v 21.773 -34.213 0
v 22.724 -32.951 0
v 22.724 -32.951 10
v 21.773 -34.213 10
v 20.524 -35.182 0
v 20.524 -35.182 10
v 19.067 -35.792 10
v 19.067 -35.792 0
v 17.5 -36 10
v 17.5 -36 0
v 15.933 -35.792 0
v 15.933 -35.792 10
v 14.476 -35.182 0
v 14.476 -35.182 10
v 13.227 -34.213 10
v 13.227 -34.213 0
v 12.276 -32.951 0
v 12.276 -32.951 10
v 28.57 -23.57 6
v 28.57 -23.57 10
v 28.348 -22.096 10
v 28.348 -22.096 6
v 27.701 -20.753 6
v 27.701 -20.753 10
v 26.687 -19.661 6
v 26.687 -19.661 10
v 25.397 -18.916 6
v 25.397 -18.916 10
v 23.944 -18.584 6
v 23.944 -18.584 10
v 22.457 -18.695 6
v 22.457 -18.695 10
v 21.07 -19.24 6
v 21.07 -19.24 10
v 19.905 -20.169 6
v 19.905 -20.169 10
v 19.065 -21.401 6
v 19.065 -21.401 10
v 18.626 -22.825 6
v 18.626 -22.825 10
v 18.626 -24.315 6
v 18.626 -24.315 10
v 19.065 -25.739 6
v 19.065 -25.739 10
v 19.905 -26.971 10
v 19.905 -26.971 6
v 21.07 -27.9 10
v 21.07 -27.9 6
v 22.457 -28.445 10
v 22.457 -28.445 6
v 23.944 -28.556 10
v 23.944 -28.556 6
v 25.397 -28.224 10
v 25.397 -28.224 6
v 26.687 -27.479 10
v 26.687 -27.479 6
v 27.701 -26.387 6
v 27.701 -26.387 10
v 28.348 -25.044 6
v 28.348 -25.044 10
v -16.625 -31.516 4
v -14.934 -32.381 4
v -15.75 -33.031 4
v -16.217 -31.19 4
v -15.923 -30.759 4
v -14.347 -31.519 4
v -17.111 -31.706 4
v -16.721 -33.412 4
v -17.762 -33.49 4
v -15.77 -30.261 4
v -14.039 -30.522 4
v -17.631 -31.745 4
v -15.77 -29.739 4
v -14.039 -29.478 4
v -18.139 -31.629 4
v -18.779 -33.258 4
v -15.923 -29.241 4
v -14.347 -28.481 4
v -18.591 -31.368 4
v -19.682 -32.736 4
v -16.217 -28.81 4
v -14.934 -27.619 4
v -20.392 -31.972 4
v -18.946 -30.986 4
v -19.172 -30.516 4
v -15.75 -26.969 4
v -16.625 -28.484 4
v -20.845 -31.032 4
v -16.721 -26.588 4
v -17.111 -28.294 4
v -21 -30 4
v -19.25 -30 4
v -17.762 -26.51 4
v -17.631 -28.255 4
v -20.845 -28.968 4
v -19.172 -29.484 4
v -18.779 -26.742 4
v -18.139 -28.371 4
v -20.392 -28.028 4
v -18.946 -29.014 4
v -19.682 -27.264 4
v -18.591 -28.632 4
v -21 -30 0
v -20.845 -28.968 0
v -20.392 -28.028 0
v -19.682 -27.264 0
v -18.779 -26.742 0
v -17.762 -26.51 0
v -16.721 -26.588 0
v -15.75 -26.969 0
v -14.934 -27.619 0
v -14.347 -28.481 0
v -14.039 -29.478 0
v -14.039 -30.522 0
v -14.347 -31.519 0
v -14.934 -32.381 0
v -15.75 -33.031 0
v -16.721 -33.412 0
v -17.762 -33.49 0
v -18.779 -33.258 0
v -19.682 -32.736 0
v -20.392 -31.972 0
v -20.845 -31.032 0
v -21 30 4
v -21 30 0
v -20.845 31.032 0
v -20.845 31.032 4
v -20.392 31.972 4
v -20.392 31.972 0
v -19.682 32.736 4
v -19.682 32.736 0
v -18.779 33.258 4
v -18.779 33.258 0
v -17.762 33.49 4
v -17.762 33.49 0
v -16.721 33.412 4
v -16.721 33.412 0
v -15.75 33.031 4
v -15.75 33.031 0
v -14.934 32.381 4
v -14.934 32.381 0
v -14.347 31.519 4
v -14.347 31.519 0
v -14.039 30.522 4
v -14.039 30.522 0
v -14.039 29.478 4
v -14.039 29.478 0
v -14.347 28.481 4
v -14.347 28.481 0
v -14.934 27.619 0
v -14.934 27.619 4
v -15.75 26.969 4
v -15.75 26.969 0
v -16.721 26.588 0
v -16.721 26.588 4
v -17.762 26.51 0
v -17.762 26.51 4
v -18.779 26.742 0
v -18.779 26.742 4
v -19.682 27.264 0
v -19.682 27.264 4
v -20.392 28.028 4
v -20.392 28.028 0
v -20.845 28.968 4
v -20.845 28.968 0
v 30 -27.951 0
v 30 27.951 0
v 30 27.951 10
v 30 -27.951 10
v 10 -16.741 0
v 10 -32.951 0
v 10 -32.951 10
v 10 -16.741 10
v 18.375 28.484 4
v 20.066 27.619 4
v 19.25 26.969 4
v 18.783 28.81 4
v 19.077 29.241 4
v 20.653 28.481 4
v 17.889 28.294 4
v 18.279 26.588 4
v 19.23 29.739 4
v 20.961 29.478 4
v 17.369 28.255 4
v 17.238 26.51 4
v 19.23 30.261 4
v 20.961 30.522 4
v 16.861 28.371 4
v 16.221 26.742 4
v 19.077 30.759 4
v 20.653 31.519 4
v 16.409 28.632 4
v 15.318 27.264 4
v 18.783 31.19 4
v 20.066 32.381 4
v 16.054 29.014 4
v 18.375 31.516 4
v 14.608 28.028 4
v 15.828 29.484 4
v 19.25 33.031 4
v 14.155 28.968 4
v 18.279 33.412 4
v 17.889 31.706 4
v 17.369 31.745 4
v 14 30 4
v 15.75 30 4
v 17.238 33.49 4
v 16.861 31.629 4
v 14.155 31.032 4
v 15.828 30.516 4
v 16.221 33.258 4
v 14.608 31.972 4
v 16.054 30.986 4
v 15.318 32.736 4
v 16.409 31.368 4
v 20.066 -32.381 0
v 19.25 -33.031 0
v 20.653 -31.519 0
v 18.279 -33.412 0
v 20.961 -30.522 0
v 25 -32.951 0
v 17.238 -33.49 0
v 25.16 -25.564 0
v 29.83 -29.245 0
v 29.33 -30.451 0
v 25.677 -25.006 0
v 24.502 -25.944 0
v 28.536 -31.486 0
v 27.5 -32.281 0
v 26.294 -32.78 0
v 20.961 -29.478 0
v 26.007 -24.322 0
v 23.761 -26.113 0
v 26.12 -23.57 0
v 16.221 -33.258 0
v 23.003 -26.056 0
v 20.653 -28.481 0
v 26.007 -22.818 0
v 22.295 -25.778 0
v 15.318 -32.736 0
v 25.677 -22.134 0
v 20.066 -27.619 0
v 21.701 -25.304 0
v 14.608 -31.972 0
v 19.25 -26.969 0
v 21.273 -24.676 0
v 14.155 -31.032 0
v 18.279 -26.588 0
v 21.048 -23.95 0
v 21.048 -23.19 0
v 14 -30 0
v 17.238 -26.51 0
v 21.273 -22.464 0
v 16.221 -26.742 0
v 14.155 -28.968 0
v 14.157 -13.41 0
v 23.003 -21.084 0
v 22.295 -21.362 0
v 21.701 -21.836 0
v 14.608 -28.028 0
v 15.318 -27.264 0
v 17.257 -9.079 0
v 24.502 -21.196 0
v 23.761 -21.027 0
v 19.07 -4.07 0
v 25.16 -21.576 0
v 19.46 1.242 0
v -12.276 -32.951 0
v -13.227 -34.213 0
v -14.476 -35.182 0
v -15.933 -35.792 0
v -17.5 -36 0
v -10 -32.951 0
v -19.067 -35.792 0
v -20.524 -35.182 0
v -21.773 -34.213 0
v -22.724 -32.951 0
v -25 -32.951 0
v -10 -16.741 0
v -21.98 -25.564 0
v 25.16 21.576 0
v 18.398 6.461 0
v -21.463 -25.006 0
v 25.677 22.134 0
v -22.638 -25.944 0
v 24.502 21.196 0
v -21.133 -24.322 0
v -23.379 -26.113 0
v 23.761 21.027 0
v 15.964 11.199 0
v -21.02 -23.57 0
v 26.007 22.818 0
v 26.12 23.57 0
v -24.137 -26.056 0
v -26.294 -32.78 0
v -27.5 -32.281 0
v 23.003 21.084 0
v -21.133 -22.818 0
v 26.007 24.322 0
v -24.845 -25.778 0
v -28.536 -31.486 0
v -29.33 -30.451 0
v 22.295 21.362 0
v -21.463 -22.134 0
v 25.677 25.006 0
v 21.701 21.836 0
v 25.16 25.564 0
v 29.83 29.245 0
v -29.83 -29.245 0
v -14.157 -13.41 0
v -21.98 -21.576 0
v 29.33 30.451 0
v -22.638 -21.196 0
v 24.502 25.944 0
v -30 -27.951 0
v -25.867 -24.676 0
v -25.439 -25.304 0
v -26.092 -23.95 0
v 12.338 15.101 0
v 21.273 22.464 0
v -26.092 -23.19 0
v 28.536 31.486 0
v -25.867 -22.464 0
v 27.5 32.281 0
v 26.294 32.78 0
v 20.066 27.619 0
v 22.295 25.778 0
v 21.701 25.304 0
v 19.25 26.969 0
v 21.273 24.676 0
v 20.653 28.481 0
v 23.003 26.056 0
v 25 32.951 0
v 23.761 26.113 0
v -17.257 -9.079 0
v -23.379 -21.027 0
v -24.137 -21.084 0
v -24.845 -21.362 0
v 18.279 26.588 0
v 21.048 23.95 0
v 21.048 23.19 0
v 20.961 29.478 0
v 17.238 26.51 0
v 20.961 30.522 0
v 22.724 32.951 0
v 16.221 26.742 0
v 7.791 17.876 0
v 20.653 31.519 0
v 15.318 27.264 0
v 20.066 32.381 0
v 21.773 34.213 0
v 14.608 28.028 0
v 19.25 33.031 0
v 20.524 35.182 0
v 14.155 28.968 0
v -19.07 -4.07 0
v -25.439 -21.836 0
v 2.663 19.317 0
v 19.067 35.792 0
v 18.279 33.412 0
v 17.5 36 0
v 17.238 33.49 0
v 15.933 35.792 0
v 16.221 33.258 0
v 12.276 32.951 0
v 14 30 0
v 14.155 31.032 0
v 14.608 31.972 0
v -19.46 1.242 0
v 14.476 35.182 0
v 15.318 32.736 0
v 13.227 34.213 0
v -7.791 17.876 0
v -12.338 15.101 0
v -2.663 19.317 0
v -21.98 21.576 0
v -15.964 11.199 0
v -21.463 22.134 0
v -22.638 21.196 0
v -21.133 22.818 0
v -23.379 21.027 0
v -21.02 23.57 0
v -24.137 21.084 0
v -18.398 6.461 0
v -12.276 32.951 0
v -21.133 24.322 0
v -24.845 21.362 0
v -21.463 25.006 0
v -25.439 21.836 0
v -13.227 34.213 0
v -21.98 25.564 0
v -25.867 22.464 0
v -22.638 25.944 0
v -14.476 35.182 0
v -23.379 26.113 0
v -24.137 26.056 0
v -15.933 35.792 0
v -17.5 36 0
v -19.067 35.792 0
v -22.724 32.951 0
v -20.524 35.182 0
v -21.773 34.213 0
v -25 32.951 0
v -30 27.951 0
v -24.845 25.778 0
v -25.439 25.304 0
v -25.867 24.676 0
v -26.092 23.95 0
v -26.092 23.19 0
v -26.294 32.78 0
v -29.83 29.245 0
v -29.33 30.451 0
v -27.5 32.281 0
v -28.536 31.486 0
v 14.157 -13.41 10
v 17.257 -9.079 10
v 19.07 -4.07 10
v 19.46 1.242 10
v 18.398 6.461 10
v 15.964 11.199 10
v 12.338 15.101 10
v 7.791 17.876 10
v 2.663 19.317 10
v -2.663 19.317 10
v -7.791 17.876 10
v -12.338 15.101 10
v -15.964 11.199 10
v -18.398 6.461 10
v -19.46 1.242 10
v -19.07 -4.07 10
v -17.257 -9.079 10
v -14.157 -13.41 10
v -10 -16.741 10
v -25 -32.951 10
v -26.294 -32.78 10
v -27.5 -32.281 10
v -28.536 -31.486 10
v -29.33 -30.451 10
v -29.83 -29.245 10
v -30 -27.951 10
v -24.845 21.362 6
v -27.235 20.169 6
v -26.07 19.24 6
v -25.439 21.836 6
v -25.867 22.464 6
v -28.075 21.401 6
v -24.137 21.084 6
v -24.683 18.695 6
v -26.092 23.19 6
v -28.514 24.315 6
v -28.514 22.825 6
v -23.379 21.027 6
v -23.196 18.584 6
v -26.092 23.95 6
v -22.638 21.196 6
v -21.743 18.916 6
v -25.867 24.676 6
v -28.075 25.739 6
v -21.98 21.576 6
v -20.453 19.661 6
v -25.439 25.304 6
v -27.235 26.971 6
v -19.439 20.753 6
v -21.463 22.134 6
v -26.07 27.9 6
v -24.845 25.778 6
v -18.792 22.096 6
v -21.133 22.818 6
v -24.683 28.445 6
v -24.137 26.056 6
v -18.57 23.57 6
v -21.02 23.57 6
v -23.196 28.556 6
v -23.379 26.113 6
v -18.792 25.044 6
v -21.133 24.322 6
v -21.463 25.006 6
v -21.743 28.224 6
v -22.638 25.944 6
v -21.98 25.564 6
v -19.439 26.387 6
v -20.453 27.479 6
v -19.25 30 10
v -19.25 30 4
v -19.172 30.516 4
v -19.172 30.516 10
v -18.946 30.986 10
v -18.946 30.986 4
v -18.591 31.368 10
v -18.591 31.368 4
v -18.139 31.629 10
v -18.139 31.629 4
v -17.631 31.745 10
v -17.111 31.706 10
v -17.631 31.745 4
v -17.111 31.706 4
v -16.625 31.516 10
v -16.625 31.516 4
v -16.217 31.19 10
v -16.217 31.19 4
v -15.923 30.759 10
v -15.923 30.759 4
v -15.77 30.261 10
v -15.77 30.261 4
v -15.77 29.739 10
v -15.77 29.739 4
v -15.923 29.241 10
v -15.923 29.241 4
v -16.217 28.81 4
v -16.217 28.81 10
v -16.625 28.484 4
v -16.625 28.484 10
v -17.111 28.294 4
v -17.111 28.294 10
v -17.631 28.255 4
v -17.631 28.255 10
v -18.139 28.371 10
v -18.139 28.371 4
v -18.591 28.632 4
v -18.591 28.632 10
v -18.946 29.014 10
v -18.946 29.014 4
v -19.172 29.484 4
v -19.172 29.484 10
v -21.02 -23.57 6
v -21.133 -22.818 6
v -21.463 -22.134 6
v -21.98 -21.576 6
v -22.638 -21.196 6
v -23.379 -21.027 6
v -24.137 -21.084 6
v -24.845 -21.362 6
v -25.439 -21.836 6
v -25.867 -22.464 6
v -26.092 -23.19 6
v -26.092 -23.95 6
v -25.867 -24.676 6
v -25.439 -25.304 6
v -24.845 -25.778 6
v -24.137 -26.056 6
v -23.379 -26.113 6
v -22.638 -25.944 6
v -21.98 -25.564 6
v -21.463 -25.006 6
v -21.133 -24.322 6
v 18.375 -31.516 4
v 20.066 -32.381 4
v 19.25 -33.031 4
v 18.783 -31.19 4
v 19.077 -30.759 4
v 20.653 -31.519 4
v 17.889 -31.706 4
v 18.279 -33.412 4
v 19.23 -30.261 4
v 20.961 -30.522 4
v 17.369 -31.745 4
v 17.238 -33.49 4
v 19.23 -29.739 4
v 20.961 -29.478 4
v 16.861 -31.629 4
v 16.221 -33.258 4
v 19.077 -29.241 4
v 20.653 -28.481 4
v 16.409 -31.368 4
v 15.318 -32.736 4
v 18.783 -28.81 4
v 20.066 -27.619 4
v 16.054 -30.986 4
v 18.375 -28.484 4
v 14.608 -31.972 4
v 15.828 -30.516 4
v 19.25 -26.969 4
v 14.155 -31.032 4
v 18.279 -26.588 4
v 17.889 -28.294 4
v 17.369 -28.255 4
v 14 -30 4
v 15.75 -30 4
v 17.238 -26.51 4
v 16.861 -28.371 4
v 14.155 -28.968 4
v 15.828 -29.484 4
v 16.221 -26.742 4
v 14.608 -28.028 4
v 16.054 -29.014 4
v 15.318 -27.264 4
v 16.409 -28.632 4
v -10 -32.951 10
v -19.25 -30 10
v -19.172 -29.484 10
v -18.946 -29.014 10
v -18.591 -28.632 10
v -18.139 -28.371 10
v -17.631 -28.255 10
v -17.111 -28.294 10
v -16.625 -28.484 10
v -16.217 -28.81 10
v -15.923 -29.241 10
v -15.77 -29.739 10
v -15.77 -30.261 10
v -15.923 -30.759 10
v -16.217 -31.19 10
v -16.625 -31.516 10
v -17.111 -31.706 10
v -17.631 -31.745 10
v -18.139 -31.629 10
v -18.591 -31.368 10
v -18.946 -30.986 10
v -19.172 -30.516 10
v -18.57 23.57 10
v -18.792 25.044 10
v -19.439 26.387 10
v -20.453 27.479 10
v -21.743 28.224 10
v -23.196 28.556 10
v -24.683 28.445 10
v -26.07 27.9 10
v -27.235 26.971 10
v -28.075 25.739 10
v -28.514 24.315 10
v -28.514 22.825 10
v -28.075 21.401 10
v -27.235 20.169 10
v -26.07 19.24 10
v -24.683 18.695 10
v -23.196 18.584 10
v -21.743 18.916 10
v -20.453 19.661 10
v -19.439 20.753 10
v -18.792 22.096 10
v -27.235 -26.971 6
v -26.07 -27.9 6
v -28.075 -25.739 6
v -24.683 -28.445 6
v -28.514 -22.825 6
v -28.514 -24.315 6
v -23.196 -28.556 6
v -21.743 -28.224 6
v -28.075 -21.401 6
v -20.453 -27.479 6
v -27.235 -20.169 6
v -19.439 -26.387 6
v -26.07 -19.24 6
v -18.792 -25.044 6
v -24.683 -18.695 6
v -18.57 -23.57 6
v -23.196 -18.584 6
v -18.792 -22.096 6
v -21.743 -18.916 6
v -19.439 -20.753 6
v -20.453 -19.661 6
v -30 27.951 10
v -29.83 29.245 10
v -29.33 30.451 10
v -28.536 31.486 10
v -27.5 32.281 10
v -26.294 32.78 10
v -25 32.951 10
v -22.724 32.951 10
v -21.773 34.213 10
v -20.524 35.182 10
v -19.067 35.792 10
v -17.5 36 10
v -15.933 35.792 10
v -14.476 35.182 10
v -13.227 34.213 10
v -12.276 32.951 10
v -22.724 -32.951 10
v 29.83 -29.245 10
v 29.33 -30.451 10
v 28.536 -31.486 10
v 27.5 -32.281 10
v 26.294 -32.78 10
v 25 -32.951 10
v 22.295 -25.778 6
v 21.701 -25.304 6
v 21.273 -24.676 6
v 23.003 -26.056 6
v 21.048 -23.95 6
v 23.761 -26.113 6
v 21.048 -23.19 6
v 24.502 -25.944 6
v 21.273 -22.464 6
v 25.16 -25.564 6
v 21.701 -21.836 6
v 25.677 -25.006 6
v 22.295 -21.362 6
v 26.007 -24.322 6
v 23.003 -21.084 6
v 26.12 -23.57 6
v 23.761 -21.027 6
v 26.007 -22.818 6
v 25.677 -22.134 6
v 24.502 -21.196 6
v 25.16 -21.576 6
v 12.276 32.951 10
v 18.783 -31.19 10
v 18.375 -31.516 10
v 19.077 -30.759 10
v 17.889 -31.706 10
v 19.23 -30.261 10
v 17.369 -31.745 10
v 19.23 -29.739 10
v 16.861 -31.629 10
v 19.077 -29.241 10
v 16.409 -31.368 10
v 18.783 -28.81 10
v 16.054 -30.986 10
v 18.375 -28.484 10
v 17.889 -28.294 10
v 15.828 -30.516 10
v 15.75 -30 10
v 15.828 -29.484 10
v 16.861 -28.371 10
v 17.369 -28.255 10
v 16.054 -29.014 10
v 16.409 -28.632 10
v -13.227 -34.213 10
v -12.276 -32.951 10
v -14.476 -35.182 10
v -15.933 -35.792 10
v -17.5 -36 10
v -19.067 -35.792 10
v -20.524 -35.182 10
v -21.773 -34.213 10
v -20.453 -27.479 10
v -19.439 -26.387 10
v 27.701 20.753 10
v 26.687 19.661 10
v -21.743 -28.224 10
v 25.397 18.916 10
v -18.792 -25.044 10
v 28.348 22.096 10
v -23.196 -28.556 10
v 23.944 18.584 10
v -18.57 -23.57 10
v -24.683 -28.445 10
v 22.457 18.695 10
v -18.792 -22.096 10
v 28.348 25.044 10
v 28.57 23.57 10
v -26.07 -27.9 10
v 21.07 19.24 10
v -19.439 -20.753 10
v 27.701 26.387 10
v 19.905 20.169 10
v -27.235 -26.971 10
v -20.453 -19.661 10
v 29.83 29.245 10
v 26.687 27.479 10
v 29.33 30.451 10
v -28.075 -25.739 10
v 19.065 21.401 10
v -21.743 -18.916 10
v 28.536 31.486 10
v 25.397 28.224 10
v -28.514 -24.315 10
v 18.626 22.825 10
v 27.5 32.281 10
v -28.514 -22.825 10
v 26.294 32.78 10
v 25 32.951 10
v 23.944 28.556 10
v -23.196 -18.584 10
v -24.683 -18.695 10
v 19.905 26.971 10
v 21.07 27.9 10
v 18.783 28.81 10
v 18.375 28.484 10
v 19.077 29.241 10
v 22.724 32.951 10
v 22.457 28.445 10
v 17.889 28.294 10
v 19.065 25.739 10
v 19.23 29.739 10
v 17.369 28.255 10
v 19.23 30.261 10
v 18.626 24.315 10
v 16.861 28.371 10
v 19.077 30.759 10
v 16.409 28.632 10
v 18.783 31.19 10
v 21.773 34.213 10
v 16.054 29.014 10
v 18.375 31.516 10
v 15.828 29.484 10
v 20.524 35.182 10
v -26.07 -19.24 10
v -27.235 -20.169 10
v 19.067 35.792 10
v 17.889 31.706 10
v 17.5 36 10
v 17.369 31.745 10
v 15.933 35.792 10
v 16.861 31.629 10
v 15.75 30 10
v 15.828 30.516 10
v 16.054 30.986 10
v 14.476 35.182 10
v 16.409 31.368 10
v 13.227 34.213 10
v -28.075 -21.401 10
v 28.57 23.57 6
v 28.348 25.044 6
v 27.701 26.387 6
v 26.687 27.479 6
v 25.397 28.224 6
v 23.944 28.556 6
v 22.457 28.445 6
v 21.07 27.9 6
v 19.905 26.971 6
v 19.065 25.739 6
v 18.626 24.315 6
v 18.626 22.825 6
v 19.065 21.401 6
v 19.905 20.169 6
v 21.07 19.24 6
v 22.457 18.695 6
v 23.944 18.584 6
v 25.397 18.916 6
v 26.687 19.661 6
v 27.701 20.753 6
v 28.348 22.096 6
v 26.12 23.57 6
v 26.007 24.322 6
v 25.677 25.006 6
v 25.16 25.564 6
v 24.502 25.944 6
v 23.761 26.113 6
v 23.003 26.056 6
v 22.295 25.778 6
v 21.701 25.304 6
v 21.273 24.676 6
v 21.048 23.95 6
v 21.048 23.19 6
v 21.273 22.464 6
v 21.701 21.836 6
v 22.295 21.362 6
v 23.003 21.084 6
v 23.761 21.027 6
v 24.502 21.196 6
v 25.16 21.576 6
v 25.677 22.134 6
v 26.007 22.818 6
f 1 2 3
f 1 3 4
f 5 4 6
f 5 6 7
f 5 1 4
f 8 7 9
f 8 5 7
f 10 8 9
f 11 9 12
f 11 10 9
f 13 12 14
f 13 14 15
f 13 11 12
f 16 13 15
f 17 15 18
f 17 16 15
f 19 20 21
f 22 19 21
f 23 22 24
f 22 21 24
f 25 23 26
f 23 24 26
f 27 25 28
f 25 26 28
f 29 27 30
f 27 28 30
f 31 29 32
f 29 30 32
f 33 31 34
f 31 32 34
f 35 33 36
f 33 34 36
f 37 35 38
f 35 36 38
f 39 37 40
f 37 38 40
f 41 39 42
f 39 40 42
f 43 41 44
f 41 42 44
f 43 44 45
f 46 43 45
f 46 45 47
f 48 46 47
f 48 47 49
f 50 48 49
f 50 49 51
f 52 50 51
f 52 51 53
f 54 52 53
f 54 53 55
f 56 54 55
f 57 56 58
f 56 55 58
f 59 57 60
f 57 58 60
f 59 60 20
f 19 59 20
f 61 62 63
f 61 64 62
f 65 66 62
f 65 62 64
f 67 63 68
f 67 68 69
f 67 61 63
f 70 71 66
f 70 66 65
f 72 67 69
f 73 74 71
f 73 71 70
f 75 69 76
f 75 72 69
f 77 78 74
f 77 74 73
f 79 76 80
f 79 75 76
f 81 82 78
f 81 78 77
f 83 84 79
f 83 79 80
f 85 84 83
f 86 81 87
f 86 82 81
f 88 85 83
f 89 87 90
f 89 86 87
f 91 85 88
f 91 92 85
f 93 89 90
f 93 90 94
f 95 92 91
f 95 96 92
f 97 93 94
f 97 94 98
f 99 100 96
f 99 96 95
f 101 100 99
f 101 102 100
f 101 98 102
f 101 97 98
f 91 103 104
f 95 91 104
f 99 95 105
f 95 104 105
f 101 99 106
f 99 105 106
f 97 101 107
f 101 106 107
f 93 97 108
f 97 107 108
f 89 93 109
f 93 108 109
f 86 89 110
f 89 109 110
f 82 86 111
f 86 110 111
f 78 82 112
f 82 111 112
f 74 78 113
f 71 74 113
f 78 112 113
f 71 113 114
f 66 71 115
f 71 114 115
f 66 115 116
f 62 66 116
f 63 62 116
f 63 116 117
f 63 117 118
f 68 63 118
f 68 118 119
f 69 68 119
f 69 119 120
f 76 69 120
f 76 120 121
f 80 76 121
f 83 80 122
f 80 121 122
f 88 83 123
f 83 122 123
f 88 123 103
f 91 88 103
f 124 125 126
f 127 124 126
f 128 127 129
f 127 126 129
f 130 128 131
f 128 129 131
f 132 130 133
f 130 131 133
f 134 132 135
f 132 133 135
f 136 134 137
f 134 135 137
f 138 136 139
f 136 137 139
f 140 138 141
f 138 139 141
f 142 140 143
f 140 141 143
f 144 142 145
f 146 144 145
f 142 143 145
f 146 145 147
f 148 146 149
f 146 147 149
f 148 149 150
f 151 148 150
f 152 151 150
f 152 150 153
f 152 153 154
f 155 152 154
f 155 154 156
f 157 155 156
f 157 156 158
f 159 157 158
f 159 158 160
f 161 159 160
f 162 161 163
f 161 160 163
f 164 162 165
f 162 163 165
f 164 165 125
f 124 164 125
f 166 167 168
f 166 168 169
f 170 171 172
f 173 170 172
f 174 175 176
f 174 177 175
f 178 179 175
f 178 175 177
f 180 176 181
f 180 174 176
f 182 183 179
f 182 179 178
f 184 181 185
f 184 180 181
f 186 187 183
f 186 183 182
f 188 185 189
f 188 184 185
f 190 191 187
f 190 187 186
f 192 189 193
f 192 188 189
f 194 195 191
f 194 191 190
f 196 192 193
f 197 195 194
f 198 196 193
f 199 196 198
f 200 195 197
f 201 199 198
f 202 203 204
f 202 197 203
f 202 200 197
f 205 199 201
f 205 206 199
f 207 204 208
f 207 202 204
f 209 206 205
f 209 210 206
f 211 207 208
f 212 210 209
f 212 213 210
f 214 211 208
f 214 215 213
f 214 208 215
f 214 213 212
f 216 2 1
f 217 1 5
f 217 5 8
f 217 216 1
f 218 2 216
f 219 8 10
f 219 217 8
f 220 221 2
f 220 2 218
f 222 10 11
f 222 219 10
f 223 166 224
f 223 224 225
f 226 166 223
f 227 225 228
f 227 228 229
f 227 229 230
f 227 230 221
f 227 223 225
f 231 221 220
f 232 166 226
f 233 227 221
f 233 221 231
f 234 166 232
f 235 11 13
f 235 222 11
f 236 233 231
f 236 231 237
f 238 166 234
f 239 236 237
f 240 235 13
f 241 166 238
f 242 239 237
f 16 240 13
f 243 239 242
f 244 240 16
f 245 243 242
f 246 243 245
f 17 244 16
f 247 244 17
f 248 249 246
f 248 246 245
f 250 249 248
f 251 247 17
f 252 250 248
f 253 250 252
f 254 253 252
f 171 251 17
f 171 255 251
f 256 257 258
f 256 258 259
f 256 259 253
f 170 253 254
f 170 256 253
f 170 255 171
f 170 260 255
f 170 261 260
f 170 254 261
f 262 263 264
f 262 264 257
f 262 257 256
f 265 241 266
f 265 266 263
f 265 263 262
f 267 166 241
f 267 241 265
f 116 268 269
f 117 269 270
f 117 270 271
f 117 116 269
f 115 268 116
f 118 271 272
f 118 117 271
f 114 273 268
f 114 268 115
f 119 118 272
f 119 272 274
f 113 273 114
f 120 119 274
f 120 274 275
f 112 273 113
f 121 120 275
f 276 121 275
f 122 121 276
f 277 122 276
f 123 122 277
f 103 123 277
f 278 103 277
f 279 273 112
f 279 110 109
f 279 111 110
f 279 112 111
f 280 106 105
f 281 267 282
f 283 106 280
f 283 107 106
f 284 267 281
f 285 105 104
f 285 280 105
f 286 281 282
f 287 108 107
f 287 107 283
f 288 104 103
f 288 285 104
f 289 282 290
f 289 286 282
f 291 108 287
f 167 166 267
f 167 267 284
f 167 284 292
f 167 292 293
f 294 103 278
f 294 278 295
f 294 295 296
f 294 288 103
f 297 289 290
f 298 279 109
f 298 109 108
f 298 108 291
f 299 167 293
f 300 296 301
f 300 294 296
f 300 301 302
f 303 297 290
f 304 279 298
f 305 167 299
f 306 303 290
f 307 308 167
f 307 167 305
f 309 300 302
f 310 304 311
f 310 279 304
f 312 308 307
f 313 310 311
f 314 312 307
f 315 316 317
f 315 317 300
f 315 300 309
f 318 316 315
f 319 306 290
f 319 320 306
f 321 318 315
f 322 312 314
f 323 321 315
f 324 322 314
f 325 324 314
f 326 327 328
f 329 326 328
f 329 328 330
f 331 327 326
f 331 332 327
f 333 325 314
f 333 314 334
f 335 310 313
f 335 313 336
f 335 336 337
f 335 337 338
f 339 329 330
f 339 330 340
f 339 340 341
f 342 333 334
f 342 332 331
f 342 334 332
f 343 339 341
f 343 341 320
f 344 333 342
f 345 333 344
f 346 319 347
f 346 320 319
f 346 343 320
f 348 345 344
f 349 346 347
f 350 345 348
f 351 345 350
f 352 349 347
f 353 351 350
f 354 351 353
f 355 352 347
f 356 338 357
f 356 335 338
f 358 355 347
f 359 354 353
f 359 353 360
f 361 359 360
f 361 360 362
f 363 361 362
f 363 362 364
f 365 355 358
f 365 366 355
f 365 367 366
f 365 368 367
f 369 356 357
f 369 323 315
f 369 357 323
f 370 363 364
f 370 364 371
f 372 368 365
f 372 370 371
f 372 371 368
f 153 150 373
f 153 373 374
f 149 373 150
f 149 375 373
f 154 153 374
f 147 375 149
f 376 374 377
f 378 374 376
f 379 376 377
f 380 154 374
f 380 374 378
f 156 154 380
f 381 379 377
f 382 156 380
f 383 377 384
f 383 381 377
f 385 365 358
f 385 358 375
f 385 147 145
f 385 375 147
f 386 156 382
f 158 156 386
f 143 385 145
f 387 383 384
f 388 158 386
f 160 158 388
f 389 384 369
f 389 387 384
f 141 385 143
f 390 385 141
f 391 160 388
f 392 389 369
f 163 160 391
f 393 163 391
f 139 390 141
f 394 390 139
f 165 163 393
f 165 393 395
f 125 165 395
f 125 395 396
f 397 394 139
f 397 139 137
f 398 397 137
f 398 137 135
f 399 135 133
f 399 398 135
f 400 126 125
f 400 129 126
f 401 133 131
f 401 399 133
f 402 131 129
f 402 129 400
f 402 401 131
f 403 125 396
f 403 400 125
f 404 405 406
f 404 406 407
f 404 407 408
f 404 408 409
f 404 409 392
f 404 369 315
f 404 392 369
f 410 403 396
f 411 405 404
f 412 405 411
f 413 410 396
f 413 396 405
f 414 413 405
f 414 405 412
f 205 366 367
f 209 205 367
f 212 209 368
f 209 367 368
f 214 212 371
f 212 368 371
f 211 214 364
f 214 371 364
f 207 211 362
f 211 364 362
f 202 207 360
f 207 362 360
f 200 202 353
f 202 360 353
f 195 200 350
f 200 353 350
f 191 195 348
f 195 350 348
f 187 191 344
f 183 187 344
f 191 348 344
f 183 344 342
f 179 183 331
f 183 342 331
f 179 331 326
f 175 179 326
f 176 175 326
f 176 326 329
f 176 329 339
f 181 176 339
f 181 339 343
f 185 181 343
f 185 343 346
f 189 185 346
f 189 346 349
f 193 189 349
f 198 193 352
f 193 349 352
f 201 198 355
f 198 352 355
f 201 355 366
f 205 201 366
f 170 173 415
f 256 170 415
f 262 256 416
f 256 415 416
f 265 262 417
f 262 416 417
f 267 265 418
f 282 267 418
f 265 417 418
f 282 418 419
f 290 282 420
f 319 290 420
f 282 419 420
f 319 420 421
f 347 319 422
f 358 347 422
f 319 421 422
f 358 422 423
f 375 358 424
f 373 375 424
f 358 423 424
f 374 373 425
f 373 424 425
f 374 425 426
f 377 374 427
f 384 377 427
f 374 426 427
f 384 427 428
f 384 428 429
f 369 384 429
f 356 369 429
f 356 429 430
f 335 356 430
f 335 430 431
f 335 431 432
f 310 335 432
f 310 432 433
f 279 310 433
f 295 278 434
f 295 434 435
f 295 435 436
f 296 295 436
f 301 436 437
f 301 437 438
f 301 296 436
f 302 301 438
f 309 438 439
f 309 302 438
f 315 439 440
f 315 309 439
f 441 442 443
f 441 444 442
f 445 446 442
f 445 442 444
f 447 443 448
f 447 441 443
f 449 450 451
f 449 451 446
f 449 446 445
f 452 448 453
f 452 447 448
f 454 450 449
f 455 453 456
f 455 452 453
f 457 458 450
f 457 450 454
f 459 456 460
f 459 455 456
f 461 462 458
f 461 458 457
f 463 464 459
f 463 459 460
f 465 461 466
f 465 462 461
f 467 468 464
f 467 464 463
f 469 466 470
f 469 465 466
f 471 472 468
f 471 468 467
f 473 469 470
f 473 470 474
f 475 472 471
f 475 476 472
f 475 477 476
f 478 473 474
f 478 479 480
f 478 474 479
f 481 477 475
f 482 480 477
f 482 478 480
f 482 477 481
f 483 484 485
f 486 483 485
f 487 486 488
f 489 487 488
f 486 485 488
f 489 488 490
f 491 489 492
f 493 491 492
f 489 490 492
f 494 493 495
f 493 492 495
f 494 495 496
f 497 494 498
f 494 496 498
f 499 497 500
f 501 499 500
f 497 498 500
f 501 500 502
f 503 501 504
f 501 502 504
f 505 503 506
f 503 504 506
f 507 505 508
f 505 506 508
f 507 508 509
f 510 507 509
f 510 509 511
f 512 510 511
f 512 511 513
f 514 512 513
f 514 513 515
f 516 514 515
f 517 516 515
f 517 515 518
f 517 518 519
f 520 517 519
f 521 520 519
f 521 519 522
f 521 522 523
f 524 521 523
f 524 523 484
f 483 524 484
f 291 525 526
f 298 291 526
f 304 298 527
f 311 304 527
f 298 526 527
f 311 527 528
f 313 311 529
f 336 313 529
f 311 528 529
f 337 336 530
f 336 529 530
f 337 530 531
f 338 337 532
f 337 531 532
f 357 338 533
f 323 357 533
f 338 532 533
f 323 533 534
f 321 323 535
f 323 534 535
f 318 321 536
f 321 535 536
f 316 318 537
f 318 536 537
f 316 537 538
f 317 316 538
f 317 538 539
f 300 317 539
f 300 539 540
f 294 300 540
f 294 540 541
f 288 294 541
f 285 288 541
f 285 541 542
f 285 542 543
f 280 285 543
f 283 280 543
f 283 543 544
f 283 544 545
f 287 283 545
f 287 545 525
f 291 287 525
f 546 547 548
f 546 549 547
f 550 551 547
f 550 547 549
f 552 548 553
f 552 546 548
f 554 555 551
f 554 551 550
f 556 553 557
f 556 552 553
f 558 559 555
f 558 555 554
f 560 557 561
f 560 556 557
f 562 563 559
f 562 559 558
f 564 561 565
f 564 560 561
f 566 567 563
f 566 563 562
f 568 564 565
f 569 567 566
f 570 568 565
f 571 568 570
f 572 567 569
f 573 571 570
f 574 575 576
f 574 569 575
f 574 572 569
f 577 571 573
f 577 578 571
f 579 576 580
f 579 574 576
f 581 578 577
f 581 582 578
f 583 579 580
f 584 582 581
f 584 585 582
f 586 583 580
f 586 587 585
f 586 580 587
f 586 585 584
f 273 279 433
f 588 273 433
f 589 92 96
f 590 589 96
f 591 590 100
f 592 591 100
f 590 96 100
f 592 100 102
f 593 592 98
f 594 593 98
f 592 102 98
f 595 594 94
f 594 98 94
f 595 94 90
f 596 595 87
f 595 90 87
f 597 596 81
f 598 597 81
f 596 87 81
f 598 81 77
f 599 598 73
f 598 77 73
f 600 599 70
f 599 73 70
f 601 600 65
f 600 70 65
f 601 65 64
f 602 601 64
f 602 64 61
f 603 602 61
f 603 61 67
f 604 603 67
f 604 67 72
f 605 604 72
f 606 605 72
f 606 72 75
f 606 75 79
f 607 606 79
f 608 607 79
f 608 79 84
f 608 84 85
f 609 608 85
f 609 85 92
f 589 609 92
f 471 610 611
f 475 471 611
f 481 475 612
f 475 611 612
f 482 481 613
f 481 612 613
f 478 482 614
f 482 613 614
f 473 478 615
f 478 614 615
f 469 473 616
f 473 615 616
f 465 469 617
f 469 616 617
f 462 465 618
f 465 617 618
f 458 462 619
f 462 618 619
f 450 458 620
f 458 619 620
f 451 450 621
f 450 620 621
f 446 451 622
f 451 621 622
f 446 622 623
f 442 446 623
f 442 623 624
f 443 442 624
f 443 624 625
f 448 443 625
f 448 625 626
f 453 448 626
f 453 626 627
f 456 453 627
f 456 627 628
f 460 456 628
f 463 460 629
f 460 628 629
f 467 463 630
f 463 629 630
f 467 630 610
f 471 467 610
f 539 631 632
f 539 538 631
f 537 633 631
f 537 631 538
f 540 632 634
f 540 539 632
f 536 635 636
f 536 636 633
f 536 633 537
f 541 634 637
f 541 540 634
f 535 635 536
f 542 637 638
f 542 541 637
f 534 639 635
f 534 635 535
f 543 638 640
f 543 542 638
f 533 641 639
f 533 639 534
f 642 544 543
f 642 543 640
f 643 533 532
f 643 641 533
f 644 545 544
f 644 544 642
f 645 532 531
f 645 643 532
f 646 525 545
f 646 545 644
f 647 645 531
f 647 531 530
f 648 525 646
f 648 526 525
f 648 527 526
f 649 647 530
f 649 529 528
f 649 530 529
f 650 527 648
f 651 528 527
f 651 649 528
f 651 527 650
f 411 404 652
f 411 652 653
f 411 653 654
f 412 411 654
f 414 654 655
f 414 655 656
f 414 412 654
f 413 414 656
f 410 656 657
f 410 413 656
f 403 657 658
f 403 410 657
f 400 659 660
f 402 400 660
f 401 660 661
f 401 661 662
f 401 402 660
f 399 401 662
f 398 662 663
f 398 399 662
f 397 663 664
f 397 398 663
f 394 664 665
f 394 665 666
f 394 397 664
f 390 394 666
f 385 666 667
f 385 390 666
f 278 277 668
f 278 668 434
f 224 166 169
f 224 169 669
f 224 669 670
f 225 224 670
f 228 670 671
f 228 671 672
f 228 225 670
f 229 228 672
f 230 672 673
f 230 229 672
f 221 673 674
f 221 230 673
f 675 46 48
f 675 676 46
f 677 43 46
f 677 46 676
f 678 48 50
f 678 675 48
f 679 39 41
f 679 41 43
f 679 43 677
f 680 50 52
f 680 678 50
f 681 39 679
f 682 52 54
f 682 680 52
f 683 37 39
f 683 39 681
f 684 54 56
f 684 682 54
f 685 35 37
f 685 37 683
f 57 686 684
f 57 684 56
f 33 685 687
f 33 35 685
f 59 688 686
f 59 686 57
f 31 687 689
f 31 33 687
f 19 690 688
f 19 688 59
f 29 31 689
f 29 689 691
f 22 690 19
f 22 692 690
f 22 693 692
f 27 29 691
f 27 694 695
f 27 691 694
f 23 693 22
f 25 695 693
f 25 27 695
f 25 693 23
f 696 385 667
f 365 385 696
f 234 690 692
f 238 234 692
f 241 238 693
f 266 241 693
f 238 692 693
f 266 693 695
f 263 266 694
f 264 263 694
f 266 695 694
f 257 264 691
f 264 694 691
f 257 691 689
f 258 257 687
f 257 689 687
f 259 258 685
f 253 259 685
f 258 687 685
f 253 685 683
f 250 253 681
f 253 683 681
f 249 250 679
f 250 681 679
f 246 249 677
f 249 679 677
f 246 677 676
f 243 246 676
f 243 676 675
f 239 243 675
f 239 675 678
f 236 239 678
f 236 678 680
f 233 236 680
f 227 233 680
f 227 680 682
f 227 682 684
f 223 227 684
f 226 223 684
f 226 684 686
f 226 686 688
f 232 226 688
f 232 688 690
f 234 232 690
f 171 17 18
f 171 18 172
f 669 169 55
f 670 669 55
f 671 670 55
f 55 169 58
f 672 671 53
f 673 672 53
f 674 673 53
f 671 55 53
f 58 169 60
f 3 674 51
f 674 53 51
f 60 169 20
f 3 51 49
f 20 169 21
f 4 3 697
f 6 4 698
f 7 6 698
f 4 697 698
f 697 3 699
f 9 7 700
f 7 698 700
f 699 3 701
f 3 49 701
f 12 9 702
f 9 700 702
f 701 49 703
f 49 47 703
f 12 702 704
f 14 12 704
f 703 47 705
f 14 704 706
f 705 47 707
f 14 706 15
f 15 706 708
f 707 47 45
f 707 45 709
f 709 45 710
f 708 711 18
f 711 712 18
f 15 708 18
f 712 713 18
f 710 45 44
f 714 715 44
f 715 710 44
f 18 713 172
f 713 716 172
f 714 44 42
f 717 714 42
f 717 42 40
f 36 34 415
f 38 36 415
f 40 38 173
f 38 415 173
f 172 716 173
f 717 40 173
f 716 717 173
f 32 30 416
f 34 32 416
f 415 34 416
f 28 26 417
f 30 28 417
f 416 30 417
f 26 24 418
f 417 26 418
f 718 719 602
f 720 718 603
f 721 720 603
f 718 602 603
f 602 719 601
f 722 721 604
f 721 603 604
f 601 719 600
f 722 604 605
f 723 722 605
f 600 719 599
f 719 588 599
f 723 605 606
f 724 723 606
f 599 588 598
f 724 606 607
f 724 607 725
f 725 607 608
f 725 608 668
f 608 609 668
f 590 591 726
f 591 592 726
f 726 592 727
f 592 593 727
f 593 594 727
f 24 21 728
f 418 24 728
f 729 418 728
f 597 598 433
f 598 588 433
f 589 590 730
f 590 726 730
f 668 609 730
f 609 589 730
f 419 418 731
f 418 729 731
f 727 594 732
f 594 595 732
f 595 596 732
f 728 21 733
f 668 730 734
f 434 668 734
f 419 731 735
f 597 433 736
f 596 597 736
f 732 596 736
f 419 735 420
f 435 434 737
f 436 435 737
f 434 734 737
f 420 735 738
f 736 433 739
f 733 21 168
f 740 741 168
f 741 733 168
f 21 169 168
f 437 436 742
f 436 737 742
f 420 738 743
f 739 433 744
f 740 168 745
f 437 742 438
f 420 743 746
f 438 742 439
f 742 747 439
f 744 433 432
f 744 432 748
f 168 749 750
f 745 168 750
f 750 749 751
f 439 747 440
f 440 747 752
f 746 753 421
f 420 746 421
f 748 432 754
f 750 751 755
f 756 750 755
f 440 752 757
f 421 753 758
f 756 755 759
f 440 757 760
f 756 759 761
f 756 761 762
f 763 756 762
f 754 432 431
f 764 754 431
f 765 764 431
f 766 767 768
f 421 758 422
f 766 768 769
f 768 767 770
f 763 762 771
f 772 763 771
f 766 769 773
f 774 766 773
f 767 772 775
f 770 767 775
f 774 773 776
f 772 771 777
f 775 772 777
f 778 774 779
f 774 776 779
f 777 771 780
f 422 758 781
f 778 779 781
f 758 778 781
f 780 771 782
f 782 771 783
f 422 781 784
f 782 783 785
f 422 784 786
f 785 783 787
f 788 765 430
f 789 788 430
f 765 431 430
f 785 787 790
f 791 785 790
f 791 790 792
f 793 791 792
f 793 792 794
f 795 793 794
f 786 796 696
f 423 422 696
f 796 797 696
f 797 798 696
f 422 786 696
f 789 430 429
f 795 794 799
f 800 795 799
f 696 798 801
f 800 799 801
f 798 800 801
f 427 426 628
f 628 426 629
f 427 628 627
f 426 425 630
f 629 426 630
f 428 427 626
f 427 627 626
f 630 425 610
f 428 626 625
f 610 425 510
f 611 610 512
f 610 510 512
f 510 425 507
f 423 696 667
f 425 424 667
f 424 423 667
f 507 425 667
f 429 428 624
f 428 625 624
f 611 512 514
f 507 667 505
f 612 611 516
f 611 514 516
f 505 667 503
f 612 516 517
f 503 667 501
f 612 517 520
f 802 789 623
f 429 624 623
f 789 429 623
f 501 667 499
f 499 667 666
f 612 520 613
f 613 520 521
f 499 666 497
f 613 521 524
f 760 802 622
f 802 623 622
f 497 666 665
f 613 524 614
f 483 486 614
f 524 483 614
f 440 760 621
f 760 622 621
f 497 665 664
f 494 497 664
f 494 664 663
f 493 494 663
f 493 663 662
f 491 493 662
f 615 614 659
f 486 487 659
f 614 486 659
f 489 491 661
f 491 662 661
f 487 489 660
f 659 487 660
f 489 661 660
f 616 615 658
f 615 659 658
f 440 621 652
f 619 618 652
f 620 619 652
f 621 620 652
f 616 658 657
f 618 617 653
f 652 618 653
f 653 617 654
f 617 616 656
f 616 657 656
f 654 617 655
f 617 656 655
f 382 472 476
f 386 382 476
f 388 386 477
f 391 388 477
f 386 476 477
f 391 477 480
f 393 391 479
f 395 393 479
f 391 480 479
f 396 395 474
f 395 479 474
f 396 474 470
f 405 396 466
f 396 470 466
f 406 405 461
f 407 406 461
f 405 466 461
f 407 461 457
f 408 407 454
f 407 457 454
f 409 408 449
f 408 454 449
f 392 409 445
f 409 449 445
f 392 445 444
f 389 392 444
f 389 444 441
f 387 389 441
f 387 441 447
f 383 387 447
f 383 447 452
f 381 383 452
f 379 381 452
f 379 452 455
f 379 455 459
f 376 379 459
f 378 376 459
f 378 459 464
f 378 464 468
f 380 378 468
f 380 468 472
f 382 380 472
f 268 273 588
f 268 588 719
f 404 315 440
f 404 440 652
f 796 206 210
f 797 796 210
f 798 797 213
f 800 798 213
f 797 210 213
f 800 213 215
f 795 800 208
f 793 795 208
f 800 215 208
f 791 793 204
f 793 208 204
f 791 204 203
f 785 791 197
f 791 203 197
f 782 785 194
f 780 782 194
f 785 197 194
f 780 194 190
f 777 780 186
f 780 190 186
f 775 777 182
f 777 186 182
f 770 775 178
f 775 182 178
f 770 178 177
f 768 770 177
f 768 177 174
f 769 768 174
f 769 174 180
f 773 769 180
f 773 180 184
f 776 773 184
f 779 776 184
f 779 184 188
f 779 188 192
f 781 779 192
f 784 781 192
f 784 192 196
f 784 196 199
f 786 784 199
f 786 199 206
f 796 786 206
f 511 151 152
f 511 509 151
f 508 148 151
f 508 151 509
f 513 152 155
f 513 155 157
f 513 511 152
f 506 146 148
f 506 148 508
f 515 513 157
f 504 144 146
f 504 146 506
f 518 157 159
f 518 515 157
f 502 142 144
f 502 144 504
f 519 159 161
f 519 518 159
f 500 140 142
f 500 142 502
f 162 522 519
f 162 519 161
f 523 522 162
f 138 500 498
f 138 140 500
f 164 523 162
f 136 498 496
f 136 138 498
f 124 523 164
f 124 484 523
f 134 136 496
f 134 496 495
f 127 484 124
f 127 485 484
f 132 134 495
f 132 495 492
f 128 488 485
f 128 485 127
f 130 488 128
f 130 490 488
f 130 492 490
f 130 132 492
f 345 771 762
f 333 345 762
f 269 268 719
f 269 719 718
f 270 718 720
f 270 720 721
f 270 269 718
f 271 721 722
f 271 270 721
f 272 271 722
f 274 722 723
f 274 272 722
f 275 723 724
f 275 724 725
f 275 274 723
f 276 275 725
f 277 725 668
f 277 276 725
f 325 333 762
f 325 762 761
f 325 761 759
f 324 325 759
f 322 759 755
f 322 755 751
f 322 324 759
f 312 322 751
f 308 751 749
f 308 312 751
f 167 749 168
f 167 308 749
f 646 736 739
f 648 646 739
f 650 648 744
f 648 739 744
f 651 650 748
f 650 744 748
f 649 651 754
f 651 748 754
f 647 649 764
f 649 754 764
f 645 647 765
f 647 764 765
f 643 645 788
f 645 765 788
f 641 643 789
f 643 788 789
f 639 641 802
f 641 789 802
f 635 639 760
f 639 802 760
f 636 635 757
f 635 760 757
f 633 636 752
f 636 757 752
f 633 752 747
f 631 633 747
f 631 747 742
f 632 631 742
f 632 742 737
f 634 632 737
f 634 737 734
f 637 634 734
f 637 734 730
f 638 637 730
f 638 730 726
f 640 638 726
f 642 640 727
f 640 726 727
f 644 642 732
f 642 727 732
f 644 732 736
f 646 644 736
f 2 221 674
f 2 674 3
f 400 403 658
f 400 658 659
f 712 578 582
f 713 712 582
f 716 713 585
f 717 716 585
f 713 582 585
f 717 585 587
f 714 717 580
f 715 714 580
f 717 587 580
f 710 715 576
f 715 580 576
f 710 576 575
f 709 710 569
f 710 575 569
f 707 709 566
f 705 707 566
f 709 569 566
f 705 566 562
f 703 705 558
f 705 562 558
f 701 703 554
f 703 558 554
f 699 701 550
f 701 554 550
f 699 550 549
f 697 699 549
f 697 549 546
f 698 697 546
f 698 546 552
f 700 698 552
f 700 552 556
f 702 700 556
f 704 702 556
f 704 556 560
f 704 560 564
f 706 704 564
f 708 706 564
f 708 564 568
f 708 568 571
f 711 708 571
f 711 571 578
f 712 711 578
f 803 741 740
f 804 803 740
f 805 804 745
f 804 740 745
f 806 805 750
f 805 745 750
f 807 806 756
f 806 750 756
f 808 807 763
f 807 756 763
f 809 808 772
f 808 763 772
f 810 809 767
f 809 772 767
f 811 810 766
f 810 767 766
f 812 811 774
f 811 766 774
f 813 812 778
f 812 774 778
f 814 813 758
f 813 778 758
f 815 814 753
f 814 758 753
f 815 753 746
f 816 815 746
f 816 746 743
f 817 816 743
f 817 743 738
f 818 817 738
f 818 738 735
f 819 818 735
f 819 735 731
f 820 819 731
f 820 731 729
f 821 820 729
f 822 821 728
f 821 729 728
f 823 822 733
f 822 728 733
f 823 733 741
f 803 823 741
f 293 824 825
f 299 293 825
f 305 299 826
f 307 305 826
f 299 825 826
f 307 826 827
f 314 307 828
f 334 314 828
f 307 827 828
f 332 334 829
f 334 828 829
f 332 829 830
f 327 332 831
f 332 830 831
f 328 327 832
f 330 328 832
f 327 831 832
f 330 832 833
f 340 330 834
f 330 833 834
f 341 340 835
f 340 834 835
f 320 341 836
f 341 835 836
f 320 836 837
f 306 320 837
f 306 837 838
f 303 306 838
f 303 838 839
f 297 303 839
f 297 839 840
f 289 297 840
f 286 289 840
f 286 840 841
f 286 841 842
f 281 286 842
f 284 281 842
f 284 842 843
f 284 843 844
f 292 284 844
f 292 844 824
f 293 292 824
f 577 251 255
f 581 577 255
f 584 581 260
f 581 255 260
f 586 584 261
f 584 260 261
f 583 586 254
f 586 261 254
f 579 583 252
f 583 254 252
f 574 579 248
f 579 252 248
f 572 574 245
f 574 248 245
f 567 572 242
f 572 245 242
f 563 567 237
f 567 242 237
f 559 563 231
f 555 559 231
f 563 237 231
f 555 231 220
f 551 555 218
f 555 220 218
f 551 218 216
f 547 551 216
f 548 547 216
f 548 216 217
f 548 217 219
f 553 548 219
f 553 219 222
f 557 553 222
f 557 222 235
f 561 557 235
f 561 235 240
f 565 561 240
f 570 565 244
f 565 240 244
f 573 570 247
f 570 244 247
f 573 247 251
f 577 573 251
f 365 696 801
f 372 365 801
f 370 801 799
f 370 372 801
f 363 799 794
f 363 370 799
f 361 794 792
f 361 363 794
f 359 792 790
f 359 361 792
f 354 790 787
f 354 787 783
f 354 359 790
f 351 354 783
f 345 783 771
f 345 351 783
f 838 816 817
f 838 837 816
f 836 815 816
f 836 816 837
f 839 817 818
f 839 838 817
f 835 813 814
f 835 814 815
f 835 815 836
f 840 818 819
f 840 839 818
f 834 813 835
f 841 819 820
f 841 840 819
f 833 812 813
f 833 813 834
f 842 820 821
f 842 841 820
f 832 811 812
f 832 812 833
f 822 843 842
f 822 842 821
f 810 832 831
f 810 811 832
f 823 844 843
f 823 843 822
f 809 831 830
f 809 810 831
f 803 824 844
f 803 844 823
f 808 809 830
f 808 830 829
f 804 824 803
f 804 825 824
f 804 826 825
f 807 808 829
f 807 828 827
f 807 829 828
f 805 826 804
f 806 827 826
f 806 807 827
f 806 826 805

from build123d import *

# Parameters (mm, degrees)
RESSALTO_EXTRUS_O1_DEPTH = 10
ESBO_O2_R                = 2.55
CORTE_EXTRUS_O1_DEPTH    = 10
ESBO_O4_R                = 19.5
CORTE_EXTRUS_O3_DEPTH    = 10
ESBO_O5_W                = 20
ESBO_O5_H                = 10
CORTE_EXTRUS_O4_DEPTH    = 30
ESBO_O6_R                = 1.75
CORTE_EXTRUS_O5_DEPTH    = 10
ESBO_O7_R                = 6
ESBO_O7_R_2              = 1.75
RESSALTO_EXTRUS_O2_DEPTH = 10
ESBO_O9_R                = 5
CORTE_EXTRUS_O6_DEPTH    = 4
ESBO_O10_R               = 3.5
CORTE_EXTRUS_O7_DEPTH    = 4


with BuildPart() as part:
    # Esboço1 → Ressalto-extrusão1 (new body)
    with BuildSketch(Plane.XY):
        with BuildLine():
            Line((25, -32.950849719), (-25, -32.950849719))
            ThreePointArc((-25, -32.950849719), (-28.535533906, -31.486383625), (-30, -27.950849719))
            Line((-30, -27.950849719), (-30, 27.950849719))
            ThreePointArc((-30, 27.950849719), (-28.535533906, 31.486383625), (-25, 32.950849719))
            Line((-25, 32.950849719), (25, 32.950849719))
            ThreePointArc((25, 32.950849719), (28.535533906, 31.486383625), (30, 27.950849719))
            Line((30, 27.950849719), (30, -27.950849719))
            ThreePointArc((30, -27.950849719), (28.535533906, -31.486383625), (25, -32.950849719))
        make_face()
    extrude(amount=RESSALTO_EXTRUS_O1_DEPTH)

    # Esboço2 → Corte-extrusão1 (cut)
    with BuildSketch(Plane.XY.offset(10)):
        with Locations((-23.57, 23.57)):
            Circle(ESBO_O2_R)
        with Locations((23.57, 23.57)):
            Circle(ESBO_O2_R)
        with Locations((23.57, -23.57)):
            Circle(ESBO_O2_R)
        with Locations((-23.57, -23.57)):
            Circle(ESBO_O2_R)
    extrude(amount=-CORTE_EXTRUS_O1_DEPTH, mode=Mode.SUBTRACT)

    # Esboço4 → Corte-extrusão3 (cut)
    with BuildSketch(Plane.XY.offset(10)):
        Circle(ESBO_O4_R)
    extrude(amount=-CORTE_EXTRUS_O3_DEPTH, mode=Mode.SUBTRACT)

    # Esboço5 → Corte-extrusão4 (cut)
    with BuildSketch(Plane.XZ.offset(32.950849719)):
        with Locations((0, 5)):
            Rectangle(ESBO_O5_W, ESBO_O5_H)
    extrude(amount=-CORTE_EXTRUS_O4_DEPTH, mode=Mode.SUBTRACT)

    # Esboço6 → Corte-extrusão5 (cut)
    with BuildSketch(Plane(origin=(0, 0, 0), x_dir=(-1, 0, 0), z_dir=(0, 0, -1))):
        with Locations((17.5, 30)):
            Circle(ESBO_O6_R)
        with Locations((-17.5, 30)):
            Circle(ESBO_O6_R)
        with Locations((-17.5, -30)):
            Circle(ESBO_O6_R)
        with Locations((17.5, -30)):
            Circle(ESBO_O6_R)
    extrude(amount=-CORTE_EXTRUS_O5_DEPTH, mode=Mode.SUBTRACT)

    # Esboço7 → Ressalto-extrusão2 (add)
    # profile 1 of 4: a face of its own
    with BuildSketch(Plane(origin=(0, 0, 0), x_dir=(-1, 0, 0), z_dir=(0, 0, -1))):
        with Locations((17.5, -30)):
            Circle(ESBO_O7_R)
        with Locations((17.5, -30)):
            Circle(ESBO_O7_R_2, mode=Mode.SUBTRACT)
    # profile 2 of 4: a face of its own
    with BuildSketch(Plane(origin=(0, 0, 0), x_dir=(-1, 0, 0), z_dir=(0, 0, -1))):
        with Locations((-17.5, -30)):
            Circle(ESBO_O7_R)
        with Locations((-17.5, -30)):
            Circle(ESBO_O7_R_2, mode=Mode.SUBTRACT)
    # profile 3 of 4: a face of its own
    with BuildSketch(Plane(origin=(0, 0, 0), x_dir=(-1, 0, 0), z_dir=(0, 0, -1))):
        with Locations((-17.5, 30)):
            Circle(ESBO_O7_R)
        with Locations((-17.5, 30)):
            Circle(ESBO_O7_R_2, mode=Mode.SUBTRACT)
    # profile 4 of 4: a face of its own
    with BuildSketch(Plane(origin=(0, 0, 0), x_dir=(-1, 0, 0), z_dir=(0, 0, -1))):
        with Locations((17.5, 30)):
            Circle(ESBO_O7_R)
        with Locations((17.5, 30)):
            Circle(ESBO_O7_R_2, mode=Mode.SUBTRACT)
    extrude(amount=-RESSALTO_EXTRUS_O2_DEPTH)

    # Esboço9 → Corte-extrusão6 (cut)
    with BuildSketch(Plane.XY.offset(10)):
        with Locations((23.57, 23.57)):
            Circle(ESBO_O9_R)
        with Locations((-23.57, 23.57)):
            Circle(ESBO_O9_R)
        with Locations((23.57, -23.57)):
            Circle(ESBO_O9_R)
        with Locations((-23.57, -23.57)):
            Circle(ESBO_O9_R)
    extrude(amount=-CORTE_EXTRUS_O6_DEPTH, mode=Mode.SUBTRACT)

    # Esboço10 → Corte-extrusão7 (cut)
    with BuildSketch(Plane(origin=(0, 0, 0), x_dir=(-1, 0, 0), z_dir=(0, 0, -1))):
        with Locations((-17.5, -30)):
            Circle(ESBO_O10_R)
        with Locations((17.5, -30)):
            Circle(ESBO_O10_R)
        with Locations((17.5, 30)):
            Circle(ESBO_O10_R)
        with Locations((-17.5, 30)):
            Circle(ESBO_O10_R)
    extrude(amount=-CORTE_EXTRUS_O7_DEPTH, mode=Mode.SUBTRACT)


solid = part.part
